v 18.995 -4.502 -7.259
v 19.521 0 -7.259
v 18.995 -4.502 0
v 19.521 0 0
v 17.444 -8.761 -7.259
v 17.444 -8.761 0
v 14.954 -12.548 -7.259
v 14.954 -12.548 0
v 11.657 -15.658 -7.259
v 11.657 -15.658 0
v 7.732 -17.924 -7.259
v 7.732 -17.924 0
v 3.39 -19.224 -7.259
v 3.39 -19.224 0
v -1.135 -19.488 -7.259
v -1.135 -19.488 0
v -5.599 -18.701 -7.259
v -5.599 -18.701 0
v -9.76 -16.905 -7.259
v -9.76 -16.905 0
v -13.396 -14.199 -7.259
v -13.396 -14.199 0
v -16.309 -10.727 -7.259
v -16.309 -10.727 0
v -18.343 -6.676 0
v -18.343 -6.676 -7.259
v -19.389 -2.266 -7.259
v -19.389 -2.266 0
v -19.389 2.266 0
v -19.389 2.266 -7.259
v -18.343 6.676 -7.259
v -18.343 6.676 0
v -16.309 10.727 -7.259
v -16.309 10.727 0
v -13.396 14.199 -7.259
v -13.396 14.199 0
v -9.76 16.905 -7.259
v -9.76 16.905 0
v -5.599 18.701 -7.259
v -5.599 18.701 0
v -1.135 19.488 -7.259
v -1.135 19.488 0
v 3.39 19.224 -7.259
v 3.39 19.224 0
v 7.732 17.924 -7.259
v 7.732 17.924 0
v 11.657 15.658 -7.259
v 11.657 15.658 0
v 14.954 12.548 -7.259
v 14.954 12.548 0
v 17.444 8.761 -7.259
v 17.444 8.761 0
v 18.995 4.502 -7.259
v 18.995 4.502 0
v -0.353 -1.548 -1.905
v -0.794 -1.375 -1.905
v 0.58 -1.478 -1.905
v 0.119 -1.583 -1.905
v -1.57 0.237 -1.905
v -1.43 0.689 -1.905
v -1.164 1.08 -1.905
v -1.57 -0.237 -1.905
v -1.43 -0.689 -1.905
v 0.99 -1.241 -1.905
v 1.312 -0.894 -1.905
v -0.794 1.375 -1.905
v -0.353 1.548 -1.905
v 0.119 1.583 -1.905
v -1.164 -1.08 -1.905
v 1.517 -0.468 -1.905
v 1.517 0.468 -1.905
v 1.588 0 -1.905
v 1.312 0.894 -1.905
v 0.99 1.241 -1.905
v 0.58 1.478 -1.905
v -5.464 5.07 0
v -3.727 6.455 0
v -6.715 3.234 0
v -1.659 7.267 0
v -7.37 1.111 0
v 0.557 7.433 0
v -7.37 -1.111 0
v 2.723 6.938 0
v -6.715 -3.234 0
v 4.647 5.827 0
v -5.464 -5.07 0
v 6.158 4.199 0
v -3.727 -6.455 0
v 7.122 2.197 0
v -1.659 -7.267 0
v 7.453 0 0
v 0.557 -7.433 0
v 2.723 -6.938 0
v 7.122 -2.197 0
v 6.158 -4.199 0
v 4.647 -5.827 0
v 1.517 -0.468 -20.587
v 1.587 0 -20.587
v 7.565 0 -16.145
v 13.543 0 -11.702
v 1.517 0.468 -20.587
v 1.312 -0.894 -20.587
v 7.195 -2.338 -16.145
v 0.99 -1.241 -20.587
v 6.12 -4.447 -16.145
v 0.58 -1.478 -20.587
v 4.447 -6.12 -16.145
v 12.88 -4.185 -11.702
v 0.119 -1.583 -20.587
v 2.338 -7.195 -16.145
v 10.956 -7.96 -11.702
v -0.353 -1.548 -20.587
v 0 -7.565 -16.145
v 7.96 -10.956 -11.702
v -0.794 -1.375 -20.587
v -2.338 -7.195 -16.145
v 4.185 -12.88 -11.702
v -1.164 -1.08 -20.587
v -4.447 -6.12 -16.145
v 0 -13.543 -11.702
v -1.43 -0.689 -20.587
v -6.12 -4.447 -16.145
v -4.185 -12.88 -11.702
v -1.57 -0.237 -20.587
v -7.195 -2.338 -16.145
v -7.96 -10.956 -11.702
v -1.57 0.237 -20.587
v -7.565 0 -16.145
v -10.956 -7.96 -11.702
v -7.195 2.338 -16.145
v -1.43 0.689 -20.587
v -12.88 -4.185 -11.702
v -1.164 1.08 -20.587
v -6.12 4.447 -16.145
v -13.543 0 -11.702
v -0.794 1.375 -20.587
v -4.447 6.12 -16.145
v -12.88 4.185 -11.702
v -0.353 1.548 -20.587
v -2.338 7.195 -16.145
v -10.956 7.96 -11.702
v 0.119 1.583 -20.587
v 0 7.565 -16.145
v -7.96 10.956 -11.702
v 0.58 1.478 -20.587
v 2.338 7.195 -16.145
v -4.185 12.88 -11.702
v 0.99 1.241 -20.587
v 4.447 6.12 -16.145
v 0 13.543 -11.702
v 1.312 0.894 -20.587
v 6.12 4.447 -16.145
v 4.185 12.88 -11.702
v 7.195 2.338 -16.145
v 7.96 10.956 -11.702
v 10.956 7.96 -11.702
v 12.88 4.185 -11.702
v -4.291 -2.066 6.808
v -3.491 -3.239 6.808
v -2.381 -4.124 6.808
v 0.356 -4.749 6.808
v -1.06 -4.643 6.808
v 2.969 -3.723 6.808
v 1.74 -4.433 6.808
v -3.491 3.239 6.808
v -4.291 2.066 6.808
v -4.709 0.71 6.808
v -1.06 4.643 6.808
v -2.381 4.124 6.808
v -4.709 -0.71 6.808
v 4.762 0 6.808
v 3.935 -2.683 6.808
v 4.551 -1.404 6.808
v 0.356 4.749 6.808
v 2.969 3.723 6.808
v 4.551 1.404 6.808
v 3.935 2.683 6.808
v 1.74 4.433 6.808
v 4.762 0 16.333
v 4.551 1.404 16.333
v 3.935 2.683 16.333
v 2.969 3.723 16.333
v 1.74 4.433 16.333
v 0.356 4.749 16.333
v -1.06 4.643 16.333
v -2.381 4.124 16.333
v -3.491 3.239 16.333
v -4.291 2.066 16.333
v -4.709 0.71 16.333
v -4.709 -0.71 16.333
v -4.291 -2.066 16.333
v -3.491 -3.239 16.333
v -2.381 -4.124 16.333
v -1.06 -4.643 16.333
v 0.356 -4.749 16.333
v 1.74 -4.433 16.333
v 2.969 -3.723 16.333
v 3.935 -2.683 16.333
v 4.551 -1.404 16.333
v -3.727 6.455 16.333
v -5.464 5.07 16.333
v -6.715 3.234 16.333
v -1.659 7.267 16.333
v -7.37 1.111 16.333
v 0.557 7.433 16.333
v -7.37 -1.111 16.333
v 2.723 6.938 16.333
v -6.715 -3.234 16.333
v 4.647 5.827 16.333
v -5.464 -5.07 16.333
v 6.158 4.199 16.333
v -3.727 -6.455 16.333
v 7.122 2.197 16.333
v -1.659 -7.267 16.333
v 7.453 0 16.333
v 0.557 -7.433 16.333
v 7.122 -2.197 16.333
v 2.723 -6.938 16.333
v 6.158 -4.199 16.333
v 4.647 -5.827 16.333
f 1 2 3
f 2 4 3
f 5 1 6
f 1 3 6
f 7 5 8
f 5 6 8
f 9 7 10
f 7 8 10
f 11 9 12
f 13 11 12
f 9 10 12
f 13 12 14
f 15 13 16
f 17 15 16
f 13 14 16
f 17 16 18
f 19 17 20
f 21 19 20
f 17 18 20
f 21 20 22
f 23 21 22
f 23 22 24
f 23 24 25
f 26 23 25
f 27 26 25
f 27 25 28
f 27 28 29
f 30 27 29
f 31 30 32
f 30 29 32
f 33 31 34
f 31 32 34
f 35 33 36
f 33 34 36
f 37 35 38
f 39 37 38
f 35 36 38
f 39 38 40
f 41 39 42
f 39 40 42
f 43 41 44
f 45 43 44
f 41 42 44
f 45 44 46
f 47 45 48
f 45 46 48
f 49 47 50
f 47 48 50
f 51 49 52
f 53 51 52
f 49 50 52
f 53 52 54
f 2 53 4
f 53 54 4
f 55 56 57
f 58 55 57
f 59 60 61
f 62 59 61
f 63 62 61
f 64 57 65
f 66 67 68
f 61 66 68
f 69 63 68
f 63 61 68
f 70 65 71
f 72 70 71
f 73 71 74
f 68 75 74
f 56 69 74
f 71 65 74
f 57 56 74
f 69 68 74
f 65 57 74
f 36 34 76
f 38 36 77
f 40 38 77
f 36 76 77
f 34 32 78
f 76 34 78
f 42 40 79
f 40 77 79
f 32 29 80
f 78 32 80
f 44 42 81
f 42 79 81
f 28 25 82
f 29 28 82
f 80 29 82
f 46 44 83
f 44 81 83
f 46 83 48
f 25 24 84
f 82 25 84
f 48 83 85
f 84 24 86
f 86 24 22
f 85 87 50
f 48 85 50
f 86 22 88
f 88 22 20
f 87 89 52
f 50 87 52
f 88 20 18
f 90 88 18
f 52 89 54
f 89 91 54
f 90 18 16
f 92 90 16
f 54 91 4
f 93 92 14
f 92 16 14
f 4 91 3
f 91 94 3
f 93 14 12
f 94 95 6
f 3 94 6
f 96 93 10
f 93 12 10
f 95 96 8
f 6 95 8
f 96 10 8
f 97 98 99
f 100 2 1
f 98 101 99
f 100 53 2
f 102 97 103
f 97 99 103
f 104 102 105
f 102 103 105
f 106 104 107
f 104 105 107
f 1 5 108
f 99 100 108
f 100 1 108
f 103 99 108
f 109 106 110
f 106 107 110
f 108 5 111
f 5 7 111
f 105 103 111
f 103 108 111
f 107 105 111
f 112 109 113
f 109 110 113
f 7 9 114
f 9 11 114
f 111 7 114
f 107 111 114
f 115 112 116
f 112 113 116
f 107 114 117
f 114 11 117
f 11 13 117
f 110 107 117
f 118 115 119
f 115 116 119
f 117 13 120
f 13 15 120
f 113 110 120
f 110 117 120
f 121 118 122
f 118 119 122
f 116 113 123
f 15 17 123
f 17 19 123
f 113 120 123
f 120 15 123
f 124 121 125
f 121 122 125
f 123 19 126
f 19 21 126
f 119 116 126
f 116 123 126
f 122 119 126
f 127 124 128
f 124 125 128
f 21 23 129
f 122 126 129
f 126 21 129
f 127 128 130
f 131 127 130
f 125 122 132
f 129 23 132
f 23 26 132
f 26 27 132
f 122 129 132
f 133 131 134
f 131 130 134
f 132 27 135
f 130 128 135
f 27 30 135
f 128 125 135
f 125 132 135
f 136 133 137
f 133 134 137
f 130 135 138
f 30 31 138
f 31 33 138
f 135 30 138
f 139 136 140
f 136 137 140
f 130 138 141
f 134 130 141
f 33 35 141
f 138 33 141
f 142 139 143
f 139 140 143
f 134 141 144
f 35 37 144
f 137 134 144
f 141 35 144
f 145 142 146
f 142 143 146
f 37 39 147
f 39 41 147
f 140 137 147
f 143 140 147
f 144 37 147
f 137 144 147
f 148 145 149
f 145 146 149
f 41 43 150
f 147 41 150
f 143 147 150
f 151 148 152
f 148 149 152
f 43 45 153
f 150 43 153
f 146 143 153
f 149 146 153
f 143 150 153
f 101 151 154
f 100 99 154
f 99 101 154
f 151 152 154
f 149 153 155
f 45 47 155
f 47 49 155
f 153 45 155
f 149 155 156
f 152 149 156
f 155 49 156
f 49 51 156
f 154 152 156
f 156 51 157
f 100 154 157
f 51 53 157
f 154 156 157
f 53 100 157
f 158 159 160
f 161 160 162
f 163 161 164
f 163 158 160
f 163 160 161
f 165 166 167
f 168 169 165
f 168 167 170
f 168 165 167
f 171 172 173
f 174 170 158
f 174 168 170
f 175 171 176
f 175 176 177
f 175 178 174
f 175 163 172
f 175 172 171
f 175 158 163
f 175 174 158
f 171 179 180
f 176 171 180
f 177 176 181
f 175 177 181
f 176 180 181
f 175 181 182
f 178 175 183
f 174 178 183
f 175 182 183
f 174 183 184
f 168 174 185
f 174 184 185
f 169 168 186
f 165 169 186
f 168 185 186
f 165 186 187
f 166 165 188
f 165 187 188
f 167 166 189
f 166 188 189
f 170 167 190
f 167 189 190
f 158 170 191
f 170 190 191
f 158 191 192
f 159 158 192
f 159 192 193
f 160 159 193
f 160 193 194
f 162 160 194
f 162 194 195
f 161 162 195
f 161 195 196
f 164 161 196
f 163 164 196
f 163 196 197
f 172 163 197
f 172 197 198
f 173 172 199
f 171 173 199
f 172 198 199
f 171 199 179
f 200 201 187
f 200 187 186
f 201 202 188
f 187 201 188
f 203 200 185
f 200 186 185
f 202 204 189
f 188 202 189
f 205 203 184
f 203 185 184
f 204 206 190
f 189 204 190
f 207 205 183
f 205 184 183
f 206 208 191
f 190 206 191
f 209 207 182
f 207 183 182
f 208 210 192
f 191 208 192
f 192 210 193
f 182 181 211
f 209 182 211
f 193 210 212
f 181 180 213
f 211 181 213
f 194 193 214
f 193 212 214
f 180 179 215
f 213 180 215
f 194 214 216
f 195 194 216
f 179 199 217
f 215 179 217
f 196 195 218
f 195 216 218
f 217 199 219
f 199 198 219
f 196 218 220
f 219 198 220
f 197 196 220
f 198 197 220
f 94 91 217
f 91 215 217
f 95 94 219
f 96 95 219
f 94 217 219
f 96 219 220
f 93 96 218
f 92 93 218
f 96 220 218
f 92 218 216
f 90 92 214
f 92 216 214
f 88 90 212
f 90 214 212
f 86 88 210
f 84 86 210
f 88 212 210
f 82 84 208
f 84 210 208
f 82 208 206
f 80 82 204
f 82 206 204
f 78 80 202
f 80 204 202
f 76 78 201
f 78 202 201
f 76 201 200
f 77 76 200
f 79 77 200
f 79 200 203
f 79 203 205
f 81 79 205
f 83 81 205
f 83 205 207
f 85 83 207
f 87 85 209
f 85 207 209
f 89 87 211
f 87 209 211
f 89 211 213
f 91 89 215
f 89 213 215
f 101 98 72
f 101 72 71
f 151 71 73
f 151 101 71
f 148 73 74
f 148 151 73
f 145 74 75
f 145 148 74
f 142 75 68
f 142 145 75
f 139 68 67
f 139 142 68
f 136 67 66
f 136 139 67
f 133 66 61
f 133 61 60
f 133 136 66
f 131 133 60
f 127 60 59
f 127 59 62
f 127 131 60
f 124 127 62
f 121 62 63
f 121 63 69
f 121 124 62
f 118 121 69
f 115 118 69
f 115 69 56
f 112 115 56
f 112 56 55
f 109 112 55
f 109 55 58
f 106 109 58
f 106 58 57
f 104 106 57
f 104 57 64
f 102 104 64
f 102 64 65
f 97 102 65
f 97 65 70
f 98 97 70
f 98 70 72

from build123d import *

# Parameters (mm, degrees)
F2_R     = 4.7625
F3_DEPTH = 9.525
F5_R     = 1.5875
F6_DEPTH = 20.32


with BuildPart() as f1:
    # F0 (on Front) → F1 (revolve)
    with BuildSketch(Plane.XZ):
        Polygon((7.453438, 16.332791), (0, 16.332791), (0, -21.767209), (19.520697, -7.259378), (19.520697, 0), (7.453438, 0), align=None)
    revolve(axis=Axis((0, 0, -2.717209), (0, 0, -1)))

    # F2 (on face) → F3 (cut)
    with BuildSketch(Plane.XY.offset(16.332791)):
        Circle(F2_R)
    extrude(amount=-F3_DEPTH, mode=Mode.SUBTRACT)

    # F5 (on offset) → F6 (cut)
    with BuildSketch(Plane.XY.offset(-22.225)):
        Circle(F5_R)
    extrude(amount=F6_DEPTH, mode=Mode.SUBTRACT)


solid = f1.part
